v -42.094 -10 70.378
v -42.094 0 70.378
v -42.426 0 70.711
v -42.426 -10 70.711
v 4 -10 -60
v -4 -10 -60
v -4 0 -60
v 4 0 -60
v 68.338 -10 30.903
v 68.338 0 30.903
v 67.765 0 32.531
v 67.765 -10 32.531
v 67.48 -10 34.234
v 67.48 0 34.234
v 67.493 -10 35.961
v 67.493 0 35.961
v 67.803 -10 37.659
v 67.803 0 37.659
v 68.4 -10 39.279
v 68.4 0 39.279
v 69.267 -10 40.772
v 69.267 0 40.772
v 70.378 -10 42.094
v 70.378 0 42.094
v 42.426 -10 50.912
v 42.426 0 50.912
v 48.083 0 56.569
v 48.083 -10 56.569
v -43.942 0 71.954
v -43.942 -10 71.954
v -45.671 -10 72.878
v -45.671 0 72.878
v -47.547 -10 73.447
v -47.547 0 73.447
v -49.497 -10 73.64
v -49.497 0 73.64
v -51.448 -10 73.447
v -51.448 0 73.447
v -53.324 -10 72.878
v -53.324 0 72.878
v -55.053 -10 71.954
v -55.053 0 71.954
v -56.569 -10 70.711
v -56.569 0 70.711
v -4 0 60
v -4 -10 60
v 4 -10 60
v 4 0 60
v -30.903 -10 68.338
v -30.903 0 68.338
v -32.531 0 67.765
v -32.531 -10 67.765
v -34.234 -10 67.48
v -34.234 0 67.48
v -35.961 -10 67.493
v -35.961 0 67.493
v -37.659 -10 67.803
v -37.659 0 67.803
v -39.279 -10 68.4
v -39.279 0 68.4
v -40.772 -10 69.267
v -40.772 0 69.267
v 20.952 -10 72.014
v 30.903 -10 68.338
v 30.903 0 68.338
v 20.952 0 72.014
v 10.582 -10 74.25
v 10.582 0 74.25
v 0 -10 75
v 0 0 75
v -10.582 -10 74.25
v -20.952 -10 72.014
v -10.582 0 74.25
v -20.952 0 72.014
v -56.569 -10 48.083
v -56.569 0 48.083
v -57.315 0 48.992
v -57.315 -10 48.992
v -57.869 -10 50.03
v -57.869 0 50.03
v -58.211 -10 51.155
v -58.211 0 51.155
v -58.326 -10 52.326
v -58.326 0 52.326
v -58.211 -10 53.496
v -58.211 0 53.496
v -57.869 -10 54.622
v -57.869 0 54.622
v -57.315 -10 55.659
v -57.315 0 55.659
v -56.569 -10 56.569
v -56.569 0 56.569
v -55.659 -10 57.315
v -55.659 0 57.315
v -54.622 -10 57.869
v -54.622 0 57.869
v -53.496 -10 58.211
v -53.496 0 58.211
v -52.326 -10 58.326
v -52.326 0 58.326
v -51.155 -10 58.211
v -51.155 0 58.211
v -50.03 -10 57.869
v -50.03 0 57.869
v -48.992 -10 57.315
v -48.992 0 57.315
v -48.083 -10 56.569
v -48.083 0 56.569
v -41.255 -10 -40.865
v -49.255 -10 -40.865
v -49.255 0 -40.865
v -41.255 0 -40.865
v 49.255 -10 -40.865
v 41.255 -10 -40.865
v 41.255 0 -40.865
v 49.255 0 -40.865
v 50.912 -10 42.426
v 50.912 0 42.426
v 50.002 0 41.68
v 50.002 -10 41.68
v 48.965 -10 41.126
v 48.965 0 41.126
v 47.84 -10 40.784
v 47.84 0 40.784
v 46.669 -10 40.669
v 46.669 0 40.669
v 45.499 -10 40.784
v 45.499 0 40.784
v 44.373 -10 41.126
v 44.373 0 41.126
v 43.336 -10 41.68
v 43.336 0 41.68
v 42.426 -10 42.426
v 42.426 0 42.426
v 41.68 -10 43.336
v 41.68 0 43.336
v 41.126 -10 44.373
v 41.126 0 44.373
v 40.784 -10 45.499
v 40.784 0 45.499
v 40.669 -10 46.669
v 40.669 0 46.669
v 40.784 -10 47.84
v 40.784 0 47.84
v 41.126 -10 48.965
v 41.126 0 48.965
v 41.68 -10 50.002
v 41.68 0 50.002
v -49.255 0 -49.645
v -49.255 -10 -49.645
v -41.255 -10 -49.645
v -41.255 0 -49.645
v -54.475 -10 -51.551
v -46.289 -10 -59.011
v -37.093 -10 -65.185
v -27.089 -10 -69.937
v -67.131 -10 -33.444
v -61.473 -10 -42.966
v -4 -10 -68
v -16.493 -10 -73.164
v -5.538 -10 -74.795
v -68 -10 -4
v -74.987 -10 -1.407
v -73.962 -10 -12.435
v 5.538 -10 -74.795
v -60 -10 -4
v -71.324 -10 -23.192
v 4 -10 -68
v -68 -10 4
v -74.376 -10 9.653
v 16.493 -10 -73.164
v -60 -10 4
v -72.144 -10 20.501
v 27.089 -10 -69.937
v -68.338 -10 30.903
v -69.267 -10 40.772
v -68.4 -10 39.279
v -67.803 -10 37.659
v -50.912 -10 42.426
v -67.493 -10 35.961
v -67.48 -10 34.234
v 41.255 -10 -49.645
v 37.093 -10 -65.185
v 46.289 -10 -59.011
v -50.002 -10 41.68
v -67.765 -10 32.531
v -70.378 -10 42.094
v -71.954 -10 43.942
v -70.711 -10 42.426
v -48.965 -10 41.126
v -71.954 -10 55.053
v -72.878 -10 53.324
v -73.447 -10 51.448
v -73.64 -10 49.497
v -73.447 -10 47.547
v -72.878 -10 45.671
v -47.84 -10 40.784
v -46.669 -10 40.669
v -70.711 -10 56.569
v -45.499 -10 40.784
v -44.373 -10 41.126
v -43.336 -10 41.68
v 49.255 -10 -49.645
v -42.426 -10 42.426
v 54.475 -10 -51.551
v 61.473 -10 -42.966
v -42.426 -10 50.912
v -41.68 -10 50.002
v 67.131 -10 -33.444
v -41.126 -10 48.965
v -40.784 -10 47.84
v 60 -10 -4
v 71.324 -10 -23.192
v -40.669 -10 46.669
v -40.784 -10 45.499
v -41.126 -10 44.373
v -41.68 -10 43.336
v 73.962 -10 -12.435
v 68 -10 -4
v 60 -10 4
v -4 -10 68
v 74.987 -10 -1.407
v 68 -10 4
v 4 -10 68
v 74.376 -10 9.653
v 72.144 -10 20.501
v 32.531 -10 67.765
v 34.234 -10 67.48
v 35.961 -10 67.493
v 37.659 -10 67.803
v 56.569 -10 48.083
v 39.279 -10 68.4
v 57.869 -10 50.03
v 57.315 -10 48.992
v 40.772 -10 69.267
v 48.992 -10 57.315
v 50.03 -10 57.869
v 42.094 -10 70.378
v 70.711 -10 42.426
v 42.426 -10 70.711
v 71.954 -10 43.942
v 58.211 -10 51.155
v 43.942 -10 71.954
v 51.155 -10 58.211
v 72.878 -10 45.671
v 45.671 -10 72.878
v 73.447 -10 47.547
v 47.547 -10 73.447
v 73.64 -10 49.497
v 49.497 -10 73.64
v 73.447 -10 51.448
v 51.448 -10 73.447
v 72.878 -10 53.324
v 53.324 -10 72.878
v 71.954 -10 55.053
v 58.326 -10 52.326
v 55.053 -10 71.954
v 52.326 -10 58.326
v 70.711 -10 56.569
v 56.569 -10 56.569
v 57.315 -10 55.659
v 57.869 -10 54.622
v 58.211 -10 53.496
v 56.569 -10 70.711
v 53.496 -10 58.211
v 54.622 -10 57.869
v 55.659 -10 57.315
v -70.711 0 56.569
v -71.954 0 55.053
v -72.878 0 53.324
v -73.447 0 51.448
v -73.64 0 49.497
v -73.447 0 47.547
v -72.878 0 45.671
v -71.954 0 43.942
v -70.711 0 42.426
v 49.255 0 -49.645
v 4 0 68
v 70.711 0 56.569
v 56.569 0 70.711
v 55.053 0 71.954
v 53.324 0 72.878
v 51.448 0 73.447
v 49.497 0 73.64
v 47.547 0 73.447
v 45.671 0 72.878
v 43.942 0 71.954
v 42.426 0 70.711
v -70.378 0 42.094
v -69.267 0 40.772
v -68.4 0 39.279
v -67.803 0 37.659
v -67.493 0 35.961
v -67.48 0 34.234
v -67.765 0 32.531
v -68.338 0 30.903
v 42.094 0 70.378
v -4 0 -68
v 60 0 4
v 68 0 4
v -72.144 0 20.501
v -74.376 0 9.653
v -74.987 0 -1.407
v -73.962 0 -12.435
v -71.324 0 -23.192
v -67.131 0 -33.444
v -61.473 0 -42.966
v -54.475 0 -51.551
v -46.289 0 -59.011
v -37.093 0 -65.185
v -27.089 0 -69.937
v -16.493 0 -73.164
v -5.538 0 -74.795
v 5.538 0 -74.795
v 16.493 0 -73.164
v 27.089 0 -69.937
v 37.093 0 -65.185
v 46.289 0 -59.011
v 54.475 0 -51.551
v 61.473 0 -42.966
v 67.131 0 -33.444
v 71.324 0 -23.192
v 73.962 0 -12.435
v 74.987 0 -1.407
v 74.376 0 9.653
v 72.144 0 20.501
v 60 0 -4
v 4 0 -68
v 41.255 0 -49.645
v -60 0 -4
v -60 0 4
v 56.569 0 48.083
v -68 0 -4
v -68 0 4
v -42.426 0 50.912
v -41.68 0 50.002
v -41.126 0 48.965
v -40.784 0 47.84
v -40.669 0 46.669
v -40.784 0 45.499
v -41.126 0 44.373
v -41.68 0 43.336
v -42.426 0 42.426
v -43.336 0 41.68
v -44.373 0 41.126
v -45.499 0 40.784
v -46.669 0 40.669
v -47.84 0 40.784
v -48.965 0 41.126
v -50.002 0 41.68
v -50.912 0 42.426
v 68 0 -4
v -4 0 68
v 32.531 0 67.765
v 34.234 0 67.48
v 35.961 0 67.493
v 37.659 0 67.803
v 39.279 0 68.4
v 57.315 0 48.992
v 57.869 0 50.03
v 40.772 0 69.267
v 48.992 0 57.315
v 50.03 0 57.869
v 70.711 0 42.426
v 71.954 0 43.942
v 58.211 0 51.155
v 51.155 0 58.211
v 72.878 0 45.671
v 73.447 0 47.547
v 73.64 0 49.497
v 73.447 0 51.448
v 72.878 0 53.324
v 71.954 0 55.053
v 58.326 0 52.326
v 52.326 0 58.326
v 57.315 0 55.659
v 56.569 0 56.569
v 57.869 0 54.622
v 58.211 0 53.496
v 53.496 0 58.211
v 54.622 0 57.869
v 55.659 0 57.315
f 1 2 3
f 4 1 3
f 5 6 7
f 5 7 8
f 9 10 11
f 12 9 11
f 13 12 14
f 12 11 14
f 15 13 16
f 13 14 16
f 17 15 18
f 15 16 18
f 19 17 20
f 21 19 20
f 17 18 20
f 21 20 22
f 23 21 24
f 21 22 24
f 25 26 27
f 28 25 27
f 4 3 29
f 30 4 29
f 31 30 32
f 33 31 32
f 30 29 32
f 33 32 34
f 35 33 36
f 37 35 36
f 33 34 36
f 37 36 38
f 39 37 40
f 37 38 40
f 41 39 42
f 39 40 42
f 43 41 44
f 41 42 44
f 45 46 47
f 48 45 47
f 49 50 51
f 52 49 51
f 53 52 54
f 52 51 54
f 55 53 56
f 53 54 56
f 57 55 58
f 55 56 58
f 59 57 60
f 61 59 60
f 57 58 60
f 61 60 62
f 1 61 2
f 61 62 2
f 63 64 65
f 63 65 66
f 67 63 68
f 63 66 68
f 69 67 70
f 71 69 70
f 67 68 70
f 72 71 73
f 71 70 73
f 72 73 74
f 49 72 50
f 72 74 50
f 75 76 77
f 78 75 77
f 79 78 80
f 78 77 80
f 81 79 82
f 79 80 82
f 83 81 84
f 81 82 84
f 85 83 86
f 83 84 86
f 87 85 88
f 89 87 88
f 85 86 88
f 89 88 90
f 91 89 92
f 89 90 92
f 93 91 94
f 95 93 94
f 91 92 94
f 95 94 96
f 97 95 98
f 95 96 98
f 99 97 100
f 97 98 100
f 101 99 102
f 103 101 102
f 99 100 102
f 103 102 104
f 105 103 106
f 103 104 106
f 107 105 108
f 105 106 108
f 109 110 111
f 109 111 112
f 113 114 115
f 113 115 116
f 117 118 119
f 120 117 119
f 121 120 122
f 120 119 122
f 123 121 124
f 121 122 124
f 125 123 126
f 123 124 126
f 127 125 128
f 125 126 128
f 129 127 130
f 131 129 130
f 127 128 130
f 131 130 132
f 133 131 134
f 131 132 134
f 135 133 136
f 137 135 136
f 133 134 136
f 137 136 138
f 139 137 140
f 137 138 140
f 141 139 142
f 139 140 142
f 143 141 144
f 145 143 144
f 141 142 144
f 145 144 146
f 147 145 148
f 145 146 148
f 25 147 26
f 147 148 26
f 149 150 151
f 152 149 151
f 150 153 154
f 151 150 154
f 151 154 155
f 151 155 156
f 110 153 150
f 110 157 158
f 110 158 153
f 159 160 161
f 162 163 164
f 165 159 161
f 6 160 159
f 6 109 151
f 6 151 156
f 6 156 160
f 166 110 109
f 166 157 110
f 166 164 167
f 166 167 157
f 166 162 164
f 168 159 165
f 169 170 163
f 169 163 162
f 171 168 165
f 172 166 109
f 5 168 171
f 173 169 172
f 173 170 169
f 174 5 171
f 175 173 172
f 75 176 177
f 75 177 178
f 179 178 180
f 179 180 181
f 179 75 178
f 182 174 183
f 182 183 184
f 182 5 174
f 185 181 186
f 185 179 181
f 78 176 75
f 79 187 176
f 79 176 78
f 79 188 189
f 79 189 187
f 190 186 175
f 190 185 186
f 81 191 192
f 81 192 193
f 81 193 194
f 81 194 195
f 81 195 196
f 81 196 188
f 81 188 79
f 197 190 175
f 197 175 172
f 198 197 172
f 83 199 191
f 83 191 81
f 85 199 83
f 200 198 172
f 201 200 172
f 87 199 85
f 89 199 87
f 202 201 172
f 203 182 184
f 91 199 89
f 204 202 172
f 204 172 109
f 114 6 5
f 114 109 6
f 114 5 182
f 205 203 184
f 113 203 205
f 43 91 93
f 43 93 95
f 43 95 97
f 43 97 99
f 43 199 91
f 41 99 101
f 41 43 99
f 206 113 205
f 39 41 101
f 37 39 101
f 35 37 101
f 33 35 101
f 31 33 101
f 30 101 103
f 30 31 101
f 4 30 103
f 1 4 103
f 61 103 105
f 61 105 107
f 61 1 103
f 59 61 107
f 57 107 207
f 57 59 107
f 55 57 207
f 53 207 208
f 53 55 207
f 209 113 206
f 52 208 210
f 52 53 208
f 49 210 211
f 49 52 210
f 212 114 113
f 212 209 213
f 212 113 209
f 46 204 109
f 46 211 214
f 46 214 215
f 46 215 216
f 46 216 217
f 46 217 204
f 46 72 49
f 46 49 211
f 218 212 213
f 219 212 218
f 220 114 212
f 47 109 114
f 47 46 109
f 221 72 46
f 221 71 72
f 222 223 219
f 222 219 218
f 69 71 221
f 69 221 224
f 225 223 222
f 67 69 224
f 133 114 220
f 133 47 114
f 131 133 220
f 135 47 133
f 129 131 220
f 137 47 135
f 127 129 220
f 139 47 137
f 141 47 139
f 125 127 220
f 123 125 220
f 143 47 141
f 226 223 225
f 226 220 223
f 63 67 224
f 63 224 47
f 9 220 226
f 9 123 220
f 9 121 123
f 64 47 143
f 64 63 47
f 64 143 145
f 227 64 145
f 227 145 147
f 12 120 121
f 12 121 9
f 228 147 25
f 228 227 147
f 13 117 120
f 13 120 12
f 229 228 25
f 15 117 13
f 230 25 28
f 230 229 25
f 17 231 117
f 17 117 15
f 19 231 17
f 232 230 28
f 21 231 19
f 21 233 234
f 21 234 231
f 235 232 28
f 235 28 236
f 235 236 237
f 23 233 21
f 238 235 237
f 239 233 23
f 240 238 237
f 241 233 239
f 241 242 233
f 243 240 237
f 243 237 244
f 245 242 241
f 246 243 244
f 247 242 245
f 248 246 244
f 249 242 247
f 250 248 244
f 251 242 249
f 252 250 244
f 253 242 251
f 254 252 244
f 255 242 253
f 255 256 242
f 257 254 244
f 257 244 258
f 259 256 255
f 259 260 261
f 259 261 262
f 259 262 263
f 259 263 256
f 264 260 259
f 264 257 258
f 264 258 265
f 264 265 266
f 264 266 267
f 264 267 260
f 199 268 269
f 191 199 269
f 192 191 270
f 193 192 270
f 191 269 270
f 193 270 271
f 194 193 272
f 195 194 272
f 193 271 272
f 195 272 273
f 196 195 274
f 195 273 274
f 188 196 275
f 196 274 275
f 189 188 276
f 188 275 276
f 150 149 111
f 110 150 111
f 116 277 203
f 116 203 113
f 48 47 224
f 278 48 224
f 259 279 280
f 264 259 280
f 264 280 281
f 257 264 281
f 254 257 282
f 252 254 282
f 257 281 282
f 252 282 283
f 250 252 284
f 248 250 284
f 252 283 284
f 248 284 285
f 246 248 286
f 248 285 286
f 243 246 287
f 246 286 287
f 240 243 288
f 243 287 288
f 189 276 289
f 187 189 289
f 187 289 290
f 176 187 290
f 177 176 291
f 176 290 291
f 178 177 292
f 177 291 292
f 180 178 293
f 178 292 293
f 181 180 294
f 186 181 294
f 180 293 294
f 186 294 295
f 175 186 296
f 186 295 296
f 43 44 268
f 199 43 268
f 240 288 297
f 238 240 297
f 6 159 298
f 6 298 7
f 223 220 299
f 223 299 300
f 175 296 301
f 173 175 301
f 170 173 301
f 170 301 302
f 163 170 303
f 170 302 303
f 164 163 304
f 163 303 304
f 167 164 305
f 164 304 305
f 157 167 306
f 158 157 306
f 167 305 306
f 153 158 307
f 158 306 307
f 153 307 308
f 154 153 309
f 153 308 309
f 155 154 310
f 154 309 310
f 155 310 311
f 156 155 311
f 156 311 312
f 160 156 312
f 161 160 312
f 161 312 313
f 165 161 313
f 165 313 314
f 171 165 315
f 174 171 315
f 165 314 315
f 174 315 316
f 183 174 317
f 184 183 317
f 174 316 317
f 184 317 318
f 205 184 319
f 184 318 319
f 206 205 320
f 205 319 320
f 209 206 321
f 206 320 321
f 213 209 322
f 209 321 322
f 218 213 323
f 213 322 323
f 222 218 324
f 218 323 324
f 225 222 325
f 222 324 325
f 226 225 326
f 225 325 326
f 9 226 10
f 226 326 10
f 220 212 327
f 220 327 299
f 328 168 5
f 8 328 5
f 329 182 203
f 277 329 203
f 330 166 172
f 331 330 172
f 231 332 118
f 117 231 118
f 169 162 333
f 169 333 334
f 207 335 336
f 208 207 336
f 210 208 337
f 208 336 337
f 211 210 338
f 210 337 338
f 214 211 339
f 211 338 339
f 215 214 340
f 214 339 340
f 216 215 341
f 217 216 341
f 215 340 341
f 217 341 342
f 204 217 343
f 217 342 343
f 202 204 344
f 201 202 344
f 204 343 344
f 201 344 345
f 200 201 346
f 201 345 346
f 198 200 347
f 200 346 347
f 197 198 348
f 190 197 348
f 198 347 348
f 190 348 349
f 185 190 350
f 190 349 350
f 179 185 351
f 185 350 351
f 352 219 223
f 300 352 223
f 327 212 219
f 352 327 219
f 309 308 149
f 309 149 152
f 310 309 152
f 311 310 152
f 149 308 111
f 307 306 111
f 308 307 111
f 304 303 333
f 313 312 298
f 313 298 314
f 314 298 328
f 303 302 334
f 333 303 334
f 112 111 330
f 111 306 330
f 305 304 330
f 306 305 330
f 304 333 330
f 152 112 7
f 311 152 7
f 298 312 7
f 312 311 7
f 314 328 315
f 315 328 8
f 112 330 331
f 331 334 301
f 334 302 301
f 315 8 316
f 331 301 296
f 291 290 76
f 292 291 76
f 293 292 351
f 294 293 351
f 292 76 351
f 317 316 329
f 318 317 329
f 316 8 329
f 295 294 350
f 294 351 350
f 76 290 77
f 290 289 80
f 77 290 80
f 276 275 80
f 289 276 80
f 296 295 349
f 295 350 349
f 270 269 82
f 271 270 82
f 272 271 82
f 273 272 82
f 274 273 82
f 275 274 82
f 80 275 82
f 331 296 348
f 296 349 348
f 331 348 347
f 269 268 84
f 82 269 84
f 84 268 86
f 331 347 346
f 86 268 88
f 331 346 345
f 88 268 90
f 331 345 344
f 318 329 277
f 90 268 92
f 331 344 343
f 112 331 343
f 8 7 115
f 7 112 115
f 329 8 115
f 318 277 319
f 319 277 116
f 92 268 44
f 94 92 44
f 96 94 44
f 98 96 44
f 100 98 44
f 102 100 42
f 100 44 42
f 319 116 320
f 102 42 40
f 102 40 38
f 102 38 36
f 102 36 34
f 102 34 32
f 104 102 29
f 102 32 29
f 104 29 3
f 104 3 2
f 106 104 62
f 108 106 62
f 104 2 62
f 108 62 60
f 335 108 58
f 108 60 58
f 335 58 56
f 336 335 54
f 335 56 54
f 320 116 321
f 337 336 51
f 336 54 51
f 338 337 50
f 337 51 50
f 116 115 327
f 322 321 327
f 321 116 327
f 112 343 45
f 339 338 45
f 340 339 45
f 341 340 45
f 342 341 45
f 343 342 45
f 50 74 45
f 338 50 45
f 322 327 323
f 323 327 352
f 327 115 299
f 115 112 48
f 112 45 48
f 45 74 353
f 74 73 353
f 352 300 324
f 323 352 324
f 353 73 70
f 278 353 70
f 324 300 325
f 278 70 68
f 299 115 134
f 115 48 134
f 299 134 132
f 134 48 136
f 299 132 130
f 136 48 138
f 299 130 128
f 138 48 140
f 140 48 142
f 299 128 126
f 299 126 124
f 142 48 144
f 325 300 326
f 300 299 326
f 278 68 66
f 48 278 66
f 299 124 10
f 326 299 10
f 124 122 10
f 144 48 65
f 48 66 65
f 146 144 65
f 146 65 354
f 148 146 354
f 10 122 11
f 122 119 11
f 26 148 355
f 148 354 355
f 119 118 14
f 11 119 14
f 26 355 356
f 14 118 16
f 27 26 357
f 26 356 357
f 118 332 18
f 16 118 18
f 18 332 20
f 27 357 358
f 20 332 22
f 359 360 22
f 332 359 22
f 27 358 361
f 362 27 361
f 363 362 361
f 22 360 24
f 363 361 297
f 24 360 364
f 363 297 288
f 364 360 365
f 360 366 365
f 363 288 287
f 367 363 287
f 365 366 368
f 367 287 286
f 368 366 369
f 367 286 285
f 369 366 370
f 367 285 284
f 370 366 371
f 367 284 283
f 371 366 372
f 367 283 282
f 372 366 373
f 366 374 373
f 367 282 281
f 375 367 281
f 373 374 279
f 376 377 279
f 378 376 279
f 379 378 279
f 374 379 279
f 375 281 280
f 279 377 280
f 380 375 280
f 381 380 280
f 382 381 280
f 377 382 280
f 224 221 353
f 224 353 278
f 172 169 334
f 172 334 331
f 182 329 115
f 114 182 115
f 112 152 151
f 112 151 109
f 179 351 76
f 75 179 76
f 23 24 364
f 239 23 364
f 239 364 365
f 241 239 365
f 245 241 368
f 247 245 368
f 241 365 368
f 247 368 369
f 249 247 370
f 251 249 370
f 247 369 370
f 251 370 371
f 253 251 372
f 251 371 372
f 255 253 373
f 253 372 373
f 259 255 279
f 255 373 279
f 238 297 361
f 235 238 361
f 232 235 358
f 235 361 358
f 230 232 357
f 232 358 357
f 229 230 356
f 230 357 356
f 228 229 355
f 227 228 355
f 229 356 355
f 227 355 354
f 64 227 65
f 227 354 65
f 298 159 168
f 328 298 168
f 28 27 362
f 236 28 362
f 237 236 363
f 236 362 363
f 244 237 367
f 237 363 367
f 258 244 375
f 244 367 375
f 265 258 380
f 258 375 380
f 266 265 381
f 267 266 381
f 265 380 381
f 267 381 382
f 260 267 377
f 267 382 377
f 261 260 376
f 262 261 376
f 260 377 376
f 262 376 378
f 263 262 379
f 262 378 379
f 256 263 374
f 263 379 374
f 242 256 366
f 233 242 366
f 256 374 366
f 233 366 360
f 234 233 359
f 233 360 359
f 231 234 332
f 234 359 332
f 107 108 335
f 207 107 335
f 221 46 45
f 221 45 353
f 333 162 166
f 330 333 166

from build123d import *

# Parameters (mm, degrees)
F1_DEPTH = 10
F3_DEPTH = 10.001
F4_W     = 8
F4_H     = 8
F4_H_2   = 8.779348
F5_DEPTH = 10.001


with BuildPart() as f1:
    # F0 (on Front) → F1 (new body)
    with BuildSketch(Plane.XZ):
        with BuildLine():
            ThreePointArc((-70.378245, 42.093974), (-67.611515, 36.816708), (-68.337629, 30.902564))
            ThreePointArc((-68.337629, 30.902564), (0, -75), (68.337629, 30.902564))
            ThreePointArc((68.337629, 30.902564), (67.611515, 36.816708), (70.378245, 42.093974))
            Line((70.378245, 42.093974), (70.710678, 42.426407))
            ThreePointArc((70.710678, 42.426407), (73.63961, 49.497475), (70.710678, 56.568542))
            Line((70.710678, 56.568542), (56.568542, 70.710678))
            ThreePointArc((56.568542, 70.710678), (49.497475, 73.63961), (42.426407, 70.710678))
            Line((42.426407, 70.710678), (42.093974, 70.378245))
            ThreePointArc((42.093974, 70.378245), (36.816708, 67.611515), (30.902564, 68.337629))
            ThreePointArc((30.902564, 68.337629), (0, 75), (-30.902564, 68.337629))
            ThreePointArc((-30.902564, 68.337629), (-36.816708, 67.611515), (-42.093974, 70.378245))
            Line((-42.093974, 70.378245), (-42.426407, 70.710678))
            ThreePointArc((-42.426407, 70.710678), (-49.497475, 73.63961), (-56.568542, 70.710678))
            Line((-56.568542, 70.710678), (-70.710678, 56.568542))
            ThreePointArc((-70.710678, 56.568542), (-73.63961, 49.497475), (-70.710678, 42.426407))
            Line((-70.710678, 42.426407), (-70.378245, 42.093974))
        make_face()
    extrude(amount=F1_DEPTH)

    # F2 (on face) → F3 (cut, through all)
    with BuildSketch(Plane(origin=(0, 0, 0), x_dir=(-1, 0, 0), z_dir=(0, 1, 0))):
        with BuildLine():
            ThreePointArc((-50.911688, 42.426407), (-42.426407, 42.426407), (-42.426407, 50.911688))
            Line((-42.426407, 50.911688), (-48.083261, 56.568542))
            ThreePointArc((-48.083261, 56.568542), (-56.568542, 56.568542), (-56.568542, 48.083261))
            Line((-56.568542, 48.083261), (-50.911688, 42.426407))
        make_face()
        with BuildLine():
            Line((50.911688, 42.426407), (56.568542, 48.083261))
            ThreePointArc((56.568542, 48.083261), (56.568542, 56.568542), (48.083261, 56.568542))
            Line((48.083261, 56.568542), (42.426407, 50.911688))
            ThreePointArc((42.426407, 50.911688), (42.426407, 42.426407), (50.911688, 42.426407))
        make_face()
    extrude(amount=-F3_DEPTH, mode=Mode.SUBTRACT)

    # F4 (on face) → F5 (cut, through all)
    with BuildSketch(Plane.XZ.offset(10)):
        with Locations((64, 0)):
            Rectangle(F4_W, F4_H)
        with Locations((0, 64)):
            Rectangle(F4_W, F4_H)
        with Locations((0, -64)):
            Rectangle(F4_W, F4_H)
        with Locations((-64, 0)):
            Rectangle(F4_W, F4_H)
        with Locations((45.254834, -45.254834)):
            Rectangle(F4_W, F4_H_2)
        with Locations((-45.254834, -45.254834)):
            Rectangle(F4_W, F4_H_2)
    extrude(amount=-F5_DEPTH, mode=Mode.SUBTRACT)


solid = f1.part
